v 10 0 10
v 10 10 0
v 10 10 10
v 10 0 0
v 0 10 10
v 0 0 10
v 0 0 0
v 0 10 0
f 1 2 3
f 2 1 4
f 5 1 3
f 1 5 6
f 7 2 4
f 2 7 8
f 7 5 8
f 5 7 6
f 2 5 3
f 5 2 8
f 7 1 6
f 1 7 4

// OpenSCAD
// file: cubeWithHoles.scad
/*
This module defines a cube that has holes on its faces.  This is meant to be used to create structures with a controllable amount of holes.  The idea is that you specify a hole radius/spacing and the module makes a prism that has the appropriate number of holes and spacing.
@param inputCubeDimensions: A 3 element array defining the length, width and breadth of the prism
@param inputHoleDiameter: The diameter of the holes to put in the cube
@param inputHoleSpacing: The center to center distance between adjacent holes in the cube
@param inputDirectionToPutHoles: A 3 element array defining which of the axises should have holes (a 1 indicates that holes should be placed) 
*/

module cubeWithHoles(inputCubeDimensions, inputHoleDiameter = 1, inputHoleSpacing = 2, inputDirectionToPutHoles = [1,1,1])
{
cube(inputCubeDimensions);

//For each of the defined axises, insert the required
counter = 0;
for(i = [0:2])
{

if(inputDirectionToPutHoles[i] == 1)
{
//Put in the holes for this axis (xy, yz, zx)
testThisThing = i % 3.0;
testThisThing2 = inputCubeDimensions[(i+1) % 3];
twoDDimensions = [inputCubeDimensions[counter%3], inputCubeDimensions[(counter+1)%3]];


//Determine how many holes in the two dimensions
//numberOfHoles = [floor(twoDimensions[0]/inputCubeDimensions)-1, floor(twoDimensions[0]/inputCubeDimensions)-1)];


}

}

}

cubeWithHoles([10, 10, 10]);
// main file
include <cubeWithHoles.scad>;

cubeWithHoles([10,10,10]);



//cube(10,10,10);
